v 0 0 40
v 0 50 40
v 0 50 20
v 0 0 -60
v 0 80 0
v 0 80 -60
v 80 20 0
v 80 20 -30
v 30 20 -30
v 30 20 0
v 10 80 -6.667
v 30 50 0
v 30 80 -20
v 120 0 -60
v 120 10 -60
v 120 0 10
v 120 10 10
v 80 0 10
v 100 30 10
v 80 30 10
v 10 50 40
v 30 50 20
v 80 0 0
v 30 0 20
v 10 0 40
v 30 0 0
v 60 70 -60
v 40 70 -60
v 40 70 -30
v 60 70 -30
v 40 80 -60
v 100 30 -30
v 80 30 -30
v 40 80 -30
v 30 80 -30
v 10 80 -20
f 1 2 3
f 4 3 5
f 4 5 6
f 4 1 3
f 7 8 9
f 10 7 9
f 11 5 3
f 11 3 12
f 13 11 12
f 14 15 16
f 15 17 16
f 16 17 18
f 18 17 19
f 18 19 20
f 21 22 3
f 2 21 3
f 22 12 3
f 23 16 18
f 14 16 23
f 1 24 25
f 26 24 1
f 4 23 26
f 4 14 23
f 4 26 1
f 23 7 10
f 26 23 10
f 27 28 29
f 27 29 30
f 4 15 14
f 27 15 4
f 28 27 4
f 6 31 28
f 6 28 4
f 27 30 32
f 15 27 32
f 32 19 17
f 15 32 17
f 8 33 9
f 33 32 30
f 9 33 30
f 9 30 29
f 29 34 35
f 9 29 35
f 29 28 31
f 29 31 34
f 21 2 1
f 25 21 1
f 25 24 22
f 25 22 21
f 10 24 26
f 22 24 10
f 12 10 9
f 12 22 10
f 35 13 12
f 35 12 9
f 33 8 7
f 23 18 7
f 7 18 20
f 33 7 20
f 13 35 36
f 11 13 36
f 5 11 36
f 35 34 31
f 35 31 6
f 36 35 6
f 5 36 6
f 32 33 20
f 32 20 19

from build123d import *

# Parameters (mm, degrees)
BOSS_EXTRUDE1_DEPTH       = 80
SKETCH2_W                 = 60
SKETCH2_H                 = 80
BOSS_EXTRUDE6_DEPTH       = 10
CUT_EXTRUDE3_DEPTH        = 149
BOSS_EXTRUDE7_DEPTH       = 20
SKETCH11_W                = 100
SKETCH11_H                = 80
CUT_EXTRUDE4_DEPTH        = 20
CUT_EXTRUDE5_DEPTH        = 20
SKETCH14_W                = 24.037008503
SKETCH14_H                = 50
CUT_EXTRUDE6_DEPTH        = 29
SKETCH15_W                = 46.666666667
SKETCH15_H                = 50
CUT_EXTRUDE7_DEPTH        = 29
SKETCH16_W                = 20
SKETCH16_H                = 30
BOSS_EXTRUDE8_DEPTH       = 70
BOSS_EXTRUDE10_DEPTH      = 30
SKETCH21_W                = 43.205783384
SKETCH21_H                = 74.052806938
CUT_EXTRUDE9_DEPTH        = 30
SKETCH22_W                = 30
SKETCH22_H                = 20
CUT_EXTRUDE10_DEPTH       = 30
BOSS_EXTRUDE11_DEPTH      = 30
BOSS_EXTRUDE12_DEPTH      = 40
BOSS_EXTRUDE12_DEPTH_BACK = 30
SKETCH25_W                = 50
SKETCH25_H                = 20
BOSS_EXTRUDE13_DEPTH      = 60
BOSS_EXTRUDE16_DEPTH      = 50
BOSS_EXTRUDE17_DEPTH      = 20


with BuildPart() as part:
    # Sketch1 → Boss-Extrude1 (new body)
    with BuildSketch(Plane(origin=(0, 0, 0), x_dir=(1, 0, 0), z_dir=(0, 1, 0))):
        Polygon((0, 0), (0, 60), (40, 60), (40, 30), (30, 30), (30, 20), align=None)
    extrude(amount=BOSS_EXTRUDE1_DEPTH)

    # Sketch2 → Boss-Extrude6 (add)
    with BuildSketch(Plane.ZY):
        with Locations((-30, 40)):
            Rectangle(SKETCH2_W, SKETCH2_H)
        Polygon((40, 0), (0, 0), (0, 80), (20, 50), (40, 50), align=None)
    extrude(amount=-BOSS_EXTRUDE6_DEPTH)

    # Sketch8 → Cut-Extrude3 (cut)
    with BuildSketch(Plane(origin=(18.823529412, 18.823529412, 28.235294118), x_dir=(0.874474632, -0.269069118, -0.403603676), z_dir=(0.48507125, 0.48507125, 0.727606875))):
        Polygon((-21.525529408, 30.508510792), (12.780783086, 41.602514717), (12.780783086, 77.658027472), (-21.525529408, 66.564023547), align=None)
    extrude(amount=CUT_EXTRUDE3_DEPTH, mode=Mode.SUBTRACT)

    # Sketch10 → Boss-Extrude7 (add)
    with BuildSketch(Plane(origin=(18.823529412, 18.823529412, 28.235294118), x_dir=(0.874474632, -0.269069118, -0.403603676), z_dir=(0.48507125, 0.48507125, 0.727606875))):
        Polygon((-21.525529408, 30.508510792), (12.780783086, 41.602514717), (12.780783086, 77.658027472), (-21.525529408, 66.564023547), align=None)
    extrude(amount=-BOSS_EXTRUDE7_DEPTH)

    # Sketch11 → Cut-Extrude4 (cut)
    with BuildSketch(Plane.ZY):
        with Locations((-10, 40)):
            Rectangle(SKETCH11_W, SKETCH11_H)
    extrude(amount=CUT_EXTRUDE4_DEPTH, mode=Mode.SUBTRACT)

    # Sketch12 → Cut-Extrude5 (cut)
    with BuildSketch(Plane(origin=(0, 50, 0), x_dir=(1, 0, 0), z_dir=(0, 1, 0))):
        Polygon((0, -20), (10, -13.333333333), (10, -40), (0, -40), align=None)
    extrude(amount=CUT_EXTRUDE5_DEPTH, mode=Mode.SUBTRACT)

    # Sketch14 → Cut-Extrude6 (cut)
    with BuildSketch(Plane(origin=(0, 0, 0), x_dir=(0.832050294, 0, -0.554700196), z_dir=(0.554700196, 0, 0.832050294))):
        with Locations((24.037008504, 25)):
            Rectangle(SKETCH14_W, SKETCH14_H)
    extrude(amount=CUT_EXTRUDE6_DEPTH, mode=Mode.SUBTRACT)

    # Sketch15 → Cut-Extrude7 (cut)
    with BuildSketch(Plane(origin=(10, 0, 0), x_dir=(0, 0, -1), z_dir=(1, 0, 0))):
        with Locations((-16.666666666, 25)):
            Rectangle(SKETCH15_W, SKETCH15_H)
    extrude(amount=CUT_EXTRUDE7_DEPTH, mode=Mode.SUBTRACT)

    # Sketch16 → Boss-Extrude8 (add)
    with BuildSketch(Plane(origin=(0, 70, 0), x_dir=(1, 0, 0), z_dir=(0, 1, 0))):
        with Locations((50, 45)):
            Rectangle(SKETCH16_W, SKETCH16_H)
    extrude(amount=-BOSS_EXTRUDE8_DEPTH)

    # Sketch17 → Boss-Extrude10 (add)
    with BuildSketch(Plane(origin=(0, 0, -60), x_dir=(-1, 0, 0), z_dir=(0, 0, -1))):
        Polygon((-80, 10), (-80, 0), (-60, 0), (-60, 70), (-100, 10), align=None)
    extrude(amount=-BOSS_EXTRUDE10_DEPTH)

    # Sketch21 → Cut-Extrude9 (cut)
    with BuildSketch(Plane.XY.offset(-30)):
        with Locations((81.602891692, 32.973596531)):
            Rectangle(SKETCH21_W, SKETCH21_H)
    extrude(amount=-CUT_EXTRUDE9_DEPTH, mode=Mode.SUBTRACT)

    # Sketch22 → Cut-Extrude10 (cut)
    with BuildSketch(Plane.XY.offset(-30)):
        with Locations((45, 10)):
            Rectangle(SKETCH22_W, SKETCH22_H)
    extrude(amount=-CUT_EXTRUDE10_DEPTH, mode=Mode.SUBTRACT)

    # Sketch23 → Boss-Extrude11 (add)
    with BuildSketch(Plane.XY.offset(-30)):
        Polygon((60, 70), (100, 30), (80, 30), (80, 20), (60, 20), align=None)
    extrude(amount=-BOSS_EXTRUDE11_DEPTH)

    # Sketch24 → Boss-Extrude12 (add, two sides)
    with BuildSketch(Plane.XY.offset(-30)) as boss_extrude12_sk:
        Polygon((100, 30), (120, 10), (120, 0), (80, 0), (80, 30), align=None)
    extrude(amount=BOSS_EXTRUDE12_DEPTH)
    extrude(boss_extrude12_sk.sketch, amount=-BOSS_EXTRUDE12_DEPTH_BACK)

    # Sketch25 → Boss-Extrude13 (add)
    with BuildSketch(Plane(origin=(0, 0, -60), x_dir=(-1, 0, 0), z_dir=(0, 0, -1))):
        with Locations((-55, 10)):
            Rectangle(SKETCH25_W, SKETCH25_H)
    extrude(amount=-BOSS_EXTRUDE13_DEPTH)

    # Sketch28 → Boss-Extrude16 (add)
    with BuildSketch(Plane(origin=(0, 0, 0), x_dir=(-1, 0, 0), z_dir=(0, -1, 0))):
        Polygon((-10, 6.666666667), (-30, 20), (-10, -6.666666667), align=None)
        Polygon((-10, -6.666666667), (-30, 20), (-30, 0), (-30, -20), (-10, -40), align=None)
    extrude(amount=-BOSS_EXTRUDE16_DEPTH)

    # Sketch29 → Boss-Extrude17 (add)
    with BuildSketch(Plane(origin=(30, 0, 0), x_dir=(0, 0, -1), z_dir=(1, 0, 0))):
        Polygon((0, 50), (20, 50), (20, 80), align=None)
    extrude(amount=-BOSS_EXTRUDE17_DEPTH)


solid = part.part
